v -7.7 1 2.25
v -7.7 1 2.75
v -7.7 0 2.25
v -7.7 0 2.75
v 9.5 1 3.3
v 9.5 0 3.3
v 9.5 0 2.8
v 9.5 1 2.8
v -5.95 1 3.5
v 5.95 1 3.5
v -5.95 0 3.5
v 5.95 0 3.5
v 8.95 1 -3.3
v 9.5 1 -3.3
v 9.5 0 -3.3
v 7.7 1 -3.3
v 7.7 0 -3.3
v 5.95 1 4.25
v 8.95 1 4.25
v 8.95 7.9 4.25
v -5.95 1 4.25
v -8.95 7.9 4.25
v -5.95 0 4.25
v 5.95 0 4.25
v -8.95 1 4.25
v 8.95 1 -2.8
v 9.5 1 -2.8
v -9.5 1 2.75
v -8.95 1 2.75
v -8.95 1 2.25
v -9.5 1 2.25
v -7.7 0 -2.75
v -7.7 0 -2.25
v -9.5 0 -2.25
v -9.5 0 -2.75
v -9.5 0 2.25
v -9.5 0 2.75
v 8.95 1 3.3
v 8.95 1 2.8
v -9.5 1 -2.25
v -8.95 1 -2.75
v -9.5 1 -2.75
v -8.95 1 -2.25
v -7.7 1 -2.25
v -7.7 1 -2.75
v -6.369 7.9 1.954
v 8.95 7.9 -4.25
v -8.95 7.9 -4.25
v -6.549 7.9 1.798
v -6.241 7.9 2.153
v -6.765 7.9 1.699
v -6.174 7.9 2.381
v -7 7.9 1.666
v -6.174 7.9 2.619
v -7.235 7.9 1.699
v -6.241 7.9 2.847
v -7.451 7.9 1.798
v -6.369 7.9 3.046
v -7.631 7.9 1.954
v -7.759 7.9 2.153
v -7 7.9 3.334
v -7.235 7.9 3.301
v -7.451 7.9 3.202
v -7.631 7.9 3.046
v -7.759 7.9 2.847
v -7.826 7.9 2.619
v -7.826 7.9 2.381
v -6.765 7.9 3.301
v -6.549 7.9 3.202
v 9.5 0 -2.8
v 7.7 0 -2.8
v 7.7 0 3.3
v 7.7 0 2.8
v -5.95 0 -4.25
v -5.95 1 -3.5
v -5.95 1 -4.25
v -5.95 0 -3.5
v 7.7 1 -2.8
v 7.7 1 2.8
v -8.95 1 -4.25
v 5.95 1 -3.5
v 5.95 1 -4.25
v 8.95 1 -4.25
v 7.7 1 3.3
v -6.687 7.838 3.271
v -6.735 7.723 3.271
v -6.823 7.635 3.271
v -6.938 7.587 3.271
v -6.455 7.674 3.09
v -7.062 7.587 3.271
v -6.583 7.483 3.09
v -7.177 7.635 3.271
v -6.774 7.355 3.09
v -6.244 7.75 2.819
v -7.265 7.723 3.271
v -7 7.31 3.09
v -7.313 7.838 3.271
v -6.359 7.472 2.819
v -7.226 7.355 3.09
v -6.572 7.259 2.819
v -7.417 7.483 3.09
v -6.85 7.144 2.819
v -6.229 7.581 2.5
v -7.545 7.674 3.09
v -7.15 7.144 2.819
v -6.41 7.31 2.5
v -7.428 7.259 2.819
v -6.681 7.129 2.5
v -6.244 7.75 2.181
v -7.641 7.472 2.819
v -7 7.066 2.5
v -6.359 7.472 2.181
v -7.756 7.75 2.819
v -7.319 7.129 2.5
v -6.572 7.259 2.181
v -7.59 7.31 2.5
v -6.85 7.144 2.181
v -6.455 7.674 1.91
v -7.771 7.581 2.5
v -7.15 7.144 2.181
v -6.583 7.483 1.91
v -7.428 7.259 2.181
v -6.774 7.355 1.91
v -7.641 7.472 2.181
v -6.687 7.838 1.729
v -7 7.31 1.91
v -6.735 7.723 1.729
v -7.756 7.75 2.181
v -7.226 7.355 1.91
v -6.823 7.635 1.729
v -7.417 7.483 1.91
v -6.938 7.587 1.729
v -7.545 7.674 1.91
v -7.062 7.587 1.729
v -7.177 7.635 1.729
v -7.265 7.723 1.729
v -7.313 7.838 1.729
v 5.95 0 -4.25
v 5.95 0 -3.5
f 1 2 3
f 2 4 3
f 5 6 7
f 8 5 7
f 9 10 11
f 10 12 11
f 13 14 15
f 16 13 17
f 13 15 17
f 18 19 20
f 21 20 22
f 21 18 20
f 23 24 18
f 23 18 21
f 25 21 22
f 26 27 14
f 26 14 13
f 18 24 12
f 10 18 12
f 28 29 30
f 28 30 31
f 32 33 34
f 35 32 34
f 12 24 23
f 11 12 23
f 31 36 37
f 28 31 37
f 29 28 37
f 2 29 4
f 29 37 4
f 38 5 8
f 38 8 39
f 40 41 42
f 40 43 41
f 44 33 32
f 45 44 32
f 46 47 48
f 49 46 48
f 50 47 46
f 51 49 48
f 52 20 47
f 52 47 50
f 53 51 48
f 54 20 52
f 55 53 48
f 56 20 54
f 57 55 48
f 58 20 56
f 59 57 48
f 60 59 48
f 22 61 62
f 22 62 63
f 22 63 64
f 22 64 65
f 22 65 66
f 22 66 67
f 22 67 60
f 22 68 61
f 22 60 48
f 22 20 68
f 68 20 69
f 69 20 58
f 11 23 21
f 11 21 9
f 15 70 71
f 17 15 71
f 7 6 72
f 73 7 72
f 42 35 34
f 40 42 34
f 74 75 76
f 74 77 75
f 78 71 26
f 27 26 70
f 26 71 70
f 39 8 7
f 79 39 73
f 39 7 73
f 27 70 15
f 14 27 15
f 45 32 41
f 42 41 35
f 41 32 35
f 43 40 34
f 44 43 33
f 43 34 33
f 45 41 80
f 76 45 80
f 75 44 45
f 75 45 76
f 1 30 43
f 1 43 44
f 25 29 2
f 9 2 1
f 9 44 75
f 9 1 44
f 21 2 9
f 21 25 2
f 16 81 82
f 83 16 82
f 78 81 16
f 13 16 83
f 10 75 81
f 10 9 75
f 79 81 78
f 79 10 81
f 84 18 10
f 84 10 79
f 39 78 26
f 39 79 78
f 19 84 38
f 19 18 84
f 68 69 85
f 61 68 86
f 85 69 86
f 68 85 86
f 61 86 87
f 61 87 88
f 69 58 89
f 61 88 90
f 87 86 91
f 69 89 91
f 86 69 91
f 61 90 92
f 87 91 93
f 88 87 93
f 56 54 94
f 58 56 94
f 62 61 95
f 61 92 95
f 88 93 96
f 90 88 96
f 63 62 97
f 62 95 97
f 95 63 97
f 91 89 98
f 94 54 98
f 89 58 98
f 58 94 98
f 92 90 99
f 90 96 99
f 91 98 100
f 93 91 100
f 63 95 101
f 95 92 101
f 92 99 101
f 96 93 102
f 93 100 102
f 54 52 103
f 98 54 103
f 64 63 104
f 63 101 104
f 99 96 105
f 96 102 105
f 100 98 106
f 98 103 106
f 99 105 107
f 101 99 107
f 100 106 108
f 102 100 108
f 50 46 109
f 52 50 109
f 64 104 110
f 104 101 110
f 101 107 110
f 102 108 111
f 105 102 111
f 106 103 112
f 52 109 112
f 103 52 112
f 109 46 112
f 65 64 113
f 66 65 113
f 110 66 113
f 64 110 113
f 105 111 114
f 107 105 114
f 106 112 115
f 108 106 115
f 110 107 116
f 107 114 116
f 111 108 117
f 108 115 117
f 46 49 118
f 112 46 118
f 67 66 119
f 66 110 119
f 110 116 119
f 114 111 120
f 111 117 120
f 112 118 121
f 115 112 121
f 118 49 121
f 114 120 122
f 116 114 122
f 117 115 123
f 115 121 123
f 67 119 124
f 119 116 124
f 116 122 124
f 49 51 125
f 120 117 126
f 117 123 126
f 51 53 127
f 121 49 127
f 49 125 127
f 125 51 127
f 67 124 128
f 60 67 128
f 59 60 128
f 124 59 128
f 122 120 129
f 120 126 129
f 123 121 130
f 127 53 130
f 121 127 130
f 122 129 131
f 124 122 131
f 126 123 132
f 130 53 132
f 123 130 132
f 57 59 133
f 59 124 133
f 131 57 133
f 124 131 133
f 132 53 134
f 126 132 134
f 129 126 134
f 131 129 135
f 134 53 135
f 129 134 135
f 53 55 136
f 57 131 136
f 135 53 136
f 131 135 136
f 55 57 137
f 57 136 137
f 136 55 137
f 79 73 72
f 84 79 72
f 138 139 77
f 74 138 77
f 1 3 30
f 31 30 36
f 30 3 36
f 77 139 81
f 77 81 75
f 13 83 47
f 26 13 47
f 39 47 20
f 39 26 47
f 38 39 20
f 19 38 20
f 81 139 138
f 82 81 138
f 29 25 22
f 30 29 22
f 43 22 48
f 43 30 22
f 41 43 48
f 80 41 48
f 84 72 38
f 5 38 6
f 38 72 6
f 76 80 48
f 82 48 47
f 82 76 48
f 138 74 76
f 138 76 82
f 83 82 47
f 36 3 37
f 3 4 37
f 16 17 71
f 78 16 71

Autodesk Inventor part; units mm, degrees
ref_plane "YZ Plane" through (0, 0, 0) normal (1, 0, 0) x (0, 1, 0)
ref_plane "XZ Plane" through (0, 0, 0) normal (0, 1, 0) x (-1, 0, 0)
ref_plane "XY Plane" through (0, 0, 0) normal (0, 0, 1) x (1, 0, 0)
sketch "Sketch1" plane through (0, 0, 0) normal (0, 1, 0) x (-1, 0, 0)
  line L0 (8.95, -4.25) -> (-8.95, -4.25)
  line L1 (-8.95, -4.25) -> (-8.95, 4.25)
  line L2 (-8.95, 4.25) -> (8.95, 4.25)
  line L3 (8.95, 4.25) -> (8.95, -4.25)
  point P0 (0, 0)
  point P1 (0, -4.25)
  point P2 (-8.95, 0)
  dimension "d0" = 17.9
  dimension "d1" = 8.5
extrude "Extrusion1" add sketch "Sketch1" along normal blind 7.9
sketch "Sketch2" plane through (0, 0, 0) normal (0, -1, 0) x (1, 0, 0)
  line L0 (-8.95, 4.25) -> (8.95, 4.25) projected
  line L1 (-8.95, 4.25) -> (-5.95, 4.25)
  line L2 (-5.95, 4.25) -> (-5.95, -4.25)
  line L3 (-5.95, -4.25) -> (-8.95, -4.25)
  line L4 (-8.95, -4.25) -> (-8.95, 4.25)
  line L5 (8.95, 4.25) -> (5.95, 4.25)
  line L6 (5.95, 4.25) -> (5.95, -4.25)
  line L7 (5.95, -4.25) -> (8.95, -4.25)
  line L8 (8.95, -4.25) -> (8.95, 4.25)
  line L9 (8.95, -4.25) -> (-8.95, -4.25) projected
  line L10 (-5.95, 4.25) -> (5.95, 4.25)
  line L11 (5.95, 4.25) -> (5.95, 3.5)
  line L12 (5.95, 3.5) -> (-5.95, 3.5)
  line L13 (-5.95, 3.5) -> (-5.95, 4.25)
  line L14 (-5.95, -4.25) -> (5.95, -4.25)
  line L15 (5.95, -4.25) -> (5.95, -3.5)
  line L16 (5.95, -3.5) -> (-5.95, -3.5)
  line L17 (-5.95, -3.5) -> (-5.95, -4.25)
  point P0 (0, 0)
  point P1 (-5.95, 3.5)
  dimension "d4" = 3
  dimension "d5" = 3
  dimension "d6" = 0.75
extrude "Extrusion2" cut sketch "Sketch2" against normal blind 1 contours L0 L2 L3 L4 | L0 L8 L7 L6 | L12 L6 L16 L2
sketch "Sketch3" plane through (0, 0, 0) normal (0, 1, 0) x (-1, 0, 0)
  line L0 (9.5, 2.75) -> (7.7, 2.75)
  line L1 (7.7, 2.75) -> (7.7, 2.25)
  line L2 (7.7, 2.25) -> (9.5, 2.25)
  line L3 (9.5, 2.25) -> (9.5, 2.75)
  line L4 (9.5, -2.25) -> (7.7, -2.25)
  line L5 (7.7, -2.25) -> (7.7, -2.75)
  line L6 (7.7, -2.75) -> (9.5, -2.75)
  line L7 (9.5, -2.75) -> (9.5, -2.25)
  line L8 (9.5, 2.5) -> (9.5, -2.5) construction
  line L9 (-7.7, 3.3) -> (-9.5, 3.3)
  line L10 (-9.5, 3.3) -> (-9.5, 2.8)
  line L11 (-9.5, 2.8) -> (-7.7, 2.8)
  line L12 (-7.7, 2.8) -> (-7.7, 3.3)
  line L13 (-7.7, -2.8) -> (-9.5, -2.8)
  line L14 (-9.5, -2.8) -> (-9.5, -3.3)
  line L15 (-9.5, -3.3) -> (-7.7, -3.3)
  line L16 (-7.7, -3.3) -> (-7.7, -2.8)
  line L17 (-9.5, 3.05) -> (-9.5, -3.05) construction
  line L18 (9.5, 0) -> (-9.5, 0) construction
  point P0 (0, 0)
  point P1 (8.6, -2.25)
  point P2 (8.6, 2.25)
  point P3 (-8.6, -2.8)
  point P4 (-8.6, 2.8)
  point P5 (0, 0)
  dimension "d9" = 0.5
  dimension "d10" = 1.8
  dimension "d11" = 0.5
  dimension "d12" = 1.8
  dimension "d13" = 5
  dimension "d14" = 0.5
  dimension "d15" = 1.8
  dimension "d16" = 0.5
  dimension "d17" = 1.8
  dimension "d19" = 6.1
  dimension "d20" = 19
extrude "Extrusion3" add sketch "Sketch3" along normal blind 1
sketch "Sketch4" plane through (0, 7.9, 0) normal (0, 1, 0) x (1, 0, 0)
  circle A0 centre (-7, -2.5) radius 0.8343
  line L0 (-7, -1.6657) -> (-7, -3.3343)
  point P0 (0, 0)
  dimension "d23" = 7
  dimension "d24" = 2.5
revolve "Revolution1" cut sketch "Sketch4" angle 360 about axis through (-7, 7.9, 1.6657) along (0, 0, 1) picked at (-6.7647, -2.2895) contours A0 L0
properties part number "ZS1052_S_HT"
